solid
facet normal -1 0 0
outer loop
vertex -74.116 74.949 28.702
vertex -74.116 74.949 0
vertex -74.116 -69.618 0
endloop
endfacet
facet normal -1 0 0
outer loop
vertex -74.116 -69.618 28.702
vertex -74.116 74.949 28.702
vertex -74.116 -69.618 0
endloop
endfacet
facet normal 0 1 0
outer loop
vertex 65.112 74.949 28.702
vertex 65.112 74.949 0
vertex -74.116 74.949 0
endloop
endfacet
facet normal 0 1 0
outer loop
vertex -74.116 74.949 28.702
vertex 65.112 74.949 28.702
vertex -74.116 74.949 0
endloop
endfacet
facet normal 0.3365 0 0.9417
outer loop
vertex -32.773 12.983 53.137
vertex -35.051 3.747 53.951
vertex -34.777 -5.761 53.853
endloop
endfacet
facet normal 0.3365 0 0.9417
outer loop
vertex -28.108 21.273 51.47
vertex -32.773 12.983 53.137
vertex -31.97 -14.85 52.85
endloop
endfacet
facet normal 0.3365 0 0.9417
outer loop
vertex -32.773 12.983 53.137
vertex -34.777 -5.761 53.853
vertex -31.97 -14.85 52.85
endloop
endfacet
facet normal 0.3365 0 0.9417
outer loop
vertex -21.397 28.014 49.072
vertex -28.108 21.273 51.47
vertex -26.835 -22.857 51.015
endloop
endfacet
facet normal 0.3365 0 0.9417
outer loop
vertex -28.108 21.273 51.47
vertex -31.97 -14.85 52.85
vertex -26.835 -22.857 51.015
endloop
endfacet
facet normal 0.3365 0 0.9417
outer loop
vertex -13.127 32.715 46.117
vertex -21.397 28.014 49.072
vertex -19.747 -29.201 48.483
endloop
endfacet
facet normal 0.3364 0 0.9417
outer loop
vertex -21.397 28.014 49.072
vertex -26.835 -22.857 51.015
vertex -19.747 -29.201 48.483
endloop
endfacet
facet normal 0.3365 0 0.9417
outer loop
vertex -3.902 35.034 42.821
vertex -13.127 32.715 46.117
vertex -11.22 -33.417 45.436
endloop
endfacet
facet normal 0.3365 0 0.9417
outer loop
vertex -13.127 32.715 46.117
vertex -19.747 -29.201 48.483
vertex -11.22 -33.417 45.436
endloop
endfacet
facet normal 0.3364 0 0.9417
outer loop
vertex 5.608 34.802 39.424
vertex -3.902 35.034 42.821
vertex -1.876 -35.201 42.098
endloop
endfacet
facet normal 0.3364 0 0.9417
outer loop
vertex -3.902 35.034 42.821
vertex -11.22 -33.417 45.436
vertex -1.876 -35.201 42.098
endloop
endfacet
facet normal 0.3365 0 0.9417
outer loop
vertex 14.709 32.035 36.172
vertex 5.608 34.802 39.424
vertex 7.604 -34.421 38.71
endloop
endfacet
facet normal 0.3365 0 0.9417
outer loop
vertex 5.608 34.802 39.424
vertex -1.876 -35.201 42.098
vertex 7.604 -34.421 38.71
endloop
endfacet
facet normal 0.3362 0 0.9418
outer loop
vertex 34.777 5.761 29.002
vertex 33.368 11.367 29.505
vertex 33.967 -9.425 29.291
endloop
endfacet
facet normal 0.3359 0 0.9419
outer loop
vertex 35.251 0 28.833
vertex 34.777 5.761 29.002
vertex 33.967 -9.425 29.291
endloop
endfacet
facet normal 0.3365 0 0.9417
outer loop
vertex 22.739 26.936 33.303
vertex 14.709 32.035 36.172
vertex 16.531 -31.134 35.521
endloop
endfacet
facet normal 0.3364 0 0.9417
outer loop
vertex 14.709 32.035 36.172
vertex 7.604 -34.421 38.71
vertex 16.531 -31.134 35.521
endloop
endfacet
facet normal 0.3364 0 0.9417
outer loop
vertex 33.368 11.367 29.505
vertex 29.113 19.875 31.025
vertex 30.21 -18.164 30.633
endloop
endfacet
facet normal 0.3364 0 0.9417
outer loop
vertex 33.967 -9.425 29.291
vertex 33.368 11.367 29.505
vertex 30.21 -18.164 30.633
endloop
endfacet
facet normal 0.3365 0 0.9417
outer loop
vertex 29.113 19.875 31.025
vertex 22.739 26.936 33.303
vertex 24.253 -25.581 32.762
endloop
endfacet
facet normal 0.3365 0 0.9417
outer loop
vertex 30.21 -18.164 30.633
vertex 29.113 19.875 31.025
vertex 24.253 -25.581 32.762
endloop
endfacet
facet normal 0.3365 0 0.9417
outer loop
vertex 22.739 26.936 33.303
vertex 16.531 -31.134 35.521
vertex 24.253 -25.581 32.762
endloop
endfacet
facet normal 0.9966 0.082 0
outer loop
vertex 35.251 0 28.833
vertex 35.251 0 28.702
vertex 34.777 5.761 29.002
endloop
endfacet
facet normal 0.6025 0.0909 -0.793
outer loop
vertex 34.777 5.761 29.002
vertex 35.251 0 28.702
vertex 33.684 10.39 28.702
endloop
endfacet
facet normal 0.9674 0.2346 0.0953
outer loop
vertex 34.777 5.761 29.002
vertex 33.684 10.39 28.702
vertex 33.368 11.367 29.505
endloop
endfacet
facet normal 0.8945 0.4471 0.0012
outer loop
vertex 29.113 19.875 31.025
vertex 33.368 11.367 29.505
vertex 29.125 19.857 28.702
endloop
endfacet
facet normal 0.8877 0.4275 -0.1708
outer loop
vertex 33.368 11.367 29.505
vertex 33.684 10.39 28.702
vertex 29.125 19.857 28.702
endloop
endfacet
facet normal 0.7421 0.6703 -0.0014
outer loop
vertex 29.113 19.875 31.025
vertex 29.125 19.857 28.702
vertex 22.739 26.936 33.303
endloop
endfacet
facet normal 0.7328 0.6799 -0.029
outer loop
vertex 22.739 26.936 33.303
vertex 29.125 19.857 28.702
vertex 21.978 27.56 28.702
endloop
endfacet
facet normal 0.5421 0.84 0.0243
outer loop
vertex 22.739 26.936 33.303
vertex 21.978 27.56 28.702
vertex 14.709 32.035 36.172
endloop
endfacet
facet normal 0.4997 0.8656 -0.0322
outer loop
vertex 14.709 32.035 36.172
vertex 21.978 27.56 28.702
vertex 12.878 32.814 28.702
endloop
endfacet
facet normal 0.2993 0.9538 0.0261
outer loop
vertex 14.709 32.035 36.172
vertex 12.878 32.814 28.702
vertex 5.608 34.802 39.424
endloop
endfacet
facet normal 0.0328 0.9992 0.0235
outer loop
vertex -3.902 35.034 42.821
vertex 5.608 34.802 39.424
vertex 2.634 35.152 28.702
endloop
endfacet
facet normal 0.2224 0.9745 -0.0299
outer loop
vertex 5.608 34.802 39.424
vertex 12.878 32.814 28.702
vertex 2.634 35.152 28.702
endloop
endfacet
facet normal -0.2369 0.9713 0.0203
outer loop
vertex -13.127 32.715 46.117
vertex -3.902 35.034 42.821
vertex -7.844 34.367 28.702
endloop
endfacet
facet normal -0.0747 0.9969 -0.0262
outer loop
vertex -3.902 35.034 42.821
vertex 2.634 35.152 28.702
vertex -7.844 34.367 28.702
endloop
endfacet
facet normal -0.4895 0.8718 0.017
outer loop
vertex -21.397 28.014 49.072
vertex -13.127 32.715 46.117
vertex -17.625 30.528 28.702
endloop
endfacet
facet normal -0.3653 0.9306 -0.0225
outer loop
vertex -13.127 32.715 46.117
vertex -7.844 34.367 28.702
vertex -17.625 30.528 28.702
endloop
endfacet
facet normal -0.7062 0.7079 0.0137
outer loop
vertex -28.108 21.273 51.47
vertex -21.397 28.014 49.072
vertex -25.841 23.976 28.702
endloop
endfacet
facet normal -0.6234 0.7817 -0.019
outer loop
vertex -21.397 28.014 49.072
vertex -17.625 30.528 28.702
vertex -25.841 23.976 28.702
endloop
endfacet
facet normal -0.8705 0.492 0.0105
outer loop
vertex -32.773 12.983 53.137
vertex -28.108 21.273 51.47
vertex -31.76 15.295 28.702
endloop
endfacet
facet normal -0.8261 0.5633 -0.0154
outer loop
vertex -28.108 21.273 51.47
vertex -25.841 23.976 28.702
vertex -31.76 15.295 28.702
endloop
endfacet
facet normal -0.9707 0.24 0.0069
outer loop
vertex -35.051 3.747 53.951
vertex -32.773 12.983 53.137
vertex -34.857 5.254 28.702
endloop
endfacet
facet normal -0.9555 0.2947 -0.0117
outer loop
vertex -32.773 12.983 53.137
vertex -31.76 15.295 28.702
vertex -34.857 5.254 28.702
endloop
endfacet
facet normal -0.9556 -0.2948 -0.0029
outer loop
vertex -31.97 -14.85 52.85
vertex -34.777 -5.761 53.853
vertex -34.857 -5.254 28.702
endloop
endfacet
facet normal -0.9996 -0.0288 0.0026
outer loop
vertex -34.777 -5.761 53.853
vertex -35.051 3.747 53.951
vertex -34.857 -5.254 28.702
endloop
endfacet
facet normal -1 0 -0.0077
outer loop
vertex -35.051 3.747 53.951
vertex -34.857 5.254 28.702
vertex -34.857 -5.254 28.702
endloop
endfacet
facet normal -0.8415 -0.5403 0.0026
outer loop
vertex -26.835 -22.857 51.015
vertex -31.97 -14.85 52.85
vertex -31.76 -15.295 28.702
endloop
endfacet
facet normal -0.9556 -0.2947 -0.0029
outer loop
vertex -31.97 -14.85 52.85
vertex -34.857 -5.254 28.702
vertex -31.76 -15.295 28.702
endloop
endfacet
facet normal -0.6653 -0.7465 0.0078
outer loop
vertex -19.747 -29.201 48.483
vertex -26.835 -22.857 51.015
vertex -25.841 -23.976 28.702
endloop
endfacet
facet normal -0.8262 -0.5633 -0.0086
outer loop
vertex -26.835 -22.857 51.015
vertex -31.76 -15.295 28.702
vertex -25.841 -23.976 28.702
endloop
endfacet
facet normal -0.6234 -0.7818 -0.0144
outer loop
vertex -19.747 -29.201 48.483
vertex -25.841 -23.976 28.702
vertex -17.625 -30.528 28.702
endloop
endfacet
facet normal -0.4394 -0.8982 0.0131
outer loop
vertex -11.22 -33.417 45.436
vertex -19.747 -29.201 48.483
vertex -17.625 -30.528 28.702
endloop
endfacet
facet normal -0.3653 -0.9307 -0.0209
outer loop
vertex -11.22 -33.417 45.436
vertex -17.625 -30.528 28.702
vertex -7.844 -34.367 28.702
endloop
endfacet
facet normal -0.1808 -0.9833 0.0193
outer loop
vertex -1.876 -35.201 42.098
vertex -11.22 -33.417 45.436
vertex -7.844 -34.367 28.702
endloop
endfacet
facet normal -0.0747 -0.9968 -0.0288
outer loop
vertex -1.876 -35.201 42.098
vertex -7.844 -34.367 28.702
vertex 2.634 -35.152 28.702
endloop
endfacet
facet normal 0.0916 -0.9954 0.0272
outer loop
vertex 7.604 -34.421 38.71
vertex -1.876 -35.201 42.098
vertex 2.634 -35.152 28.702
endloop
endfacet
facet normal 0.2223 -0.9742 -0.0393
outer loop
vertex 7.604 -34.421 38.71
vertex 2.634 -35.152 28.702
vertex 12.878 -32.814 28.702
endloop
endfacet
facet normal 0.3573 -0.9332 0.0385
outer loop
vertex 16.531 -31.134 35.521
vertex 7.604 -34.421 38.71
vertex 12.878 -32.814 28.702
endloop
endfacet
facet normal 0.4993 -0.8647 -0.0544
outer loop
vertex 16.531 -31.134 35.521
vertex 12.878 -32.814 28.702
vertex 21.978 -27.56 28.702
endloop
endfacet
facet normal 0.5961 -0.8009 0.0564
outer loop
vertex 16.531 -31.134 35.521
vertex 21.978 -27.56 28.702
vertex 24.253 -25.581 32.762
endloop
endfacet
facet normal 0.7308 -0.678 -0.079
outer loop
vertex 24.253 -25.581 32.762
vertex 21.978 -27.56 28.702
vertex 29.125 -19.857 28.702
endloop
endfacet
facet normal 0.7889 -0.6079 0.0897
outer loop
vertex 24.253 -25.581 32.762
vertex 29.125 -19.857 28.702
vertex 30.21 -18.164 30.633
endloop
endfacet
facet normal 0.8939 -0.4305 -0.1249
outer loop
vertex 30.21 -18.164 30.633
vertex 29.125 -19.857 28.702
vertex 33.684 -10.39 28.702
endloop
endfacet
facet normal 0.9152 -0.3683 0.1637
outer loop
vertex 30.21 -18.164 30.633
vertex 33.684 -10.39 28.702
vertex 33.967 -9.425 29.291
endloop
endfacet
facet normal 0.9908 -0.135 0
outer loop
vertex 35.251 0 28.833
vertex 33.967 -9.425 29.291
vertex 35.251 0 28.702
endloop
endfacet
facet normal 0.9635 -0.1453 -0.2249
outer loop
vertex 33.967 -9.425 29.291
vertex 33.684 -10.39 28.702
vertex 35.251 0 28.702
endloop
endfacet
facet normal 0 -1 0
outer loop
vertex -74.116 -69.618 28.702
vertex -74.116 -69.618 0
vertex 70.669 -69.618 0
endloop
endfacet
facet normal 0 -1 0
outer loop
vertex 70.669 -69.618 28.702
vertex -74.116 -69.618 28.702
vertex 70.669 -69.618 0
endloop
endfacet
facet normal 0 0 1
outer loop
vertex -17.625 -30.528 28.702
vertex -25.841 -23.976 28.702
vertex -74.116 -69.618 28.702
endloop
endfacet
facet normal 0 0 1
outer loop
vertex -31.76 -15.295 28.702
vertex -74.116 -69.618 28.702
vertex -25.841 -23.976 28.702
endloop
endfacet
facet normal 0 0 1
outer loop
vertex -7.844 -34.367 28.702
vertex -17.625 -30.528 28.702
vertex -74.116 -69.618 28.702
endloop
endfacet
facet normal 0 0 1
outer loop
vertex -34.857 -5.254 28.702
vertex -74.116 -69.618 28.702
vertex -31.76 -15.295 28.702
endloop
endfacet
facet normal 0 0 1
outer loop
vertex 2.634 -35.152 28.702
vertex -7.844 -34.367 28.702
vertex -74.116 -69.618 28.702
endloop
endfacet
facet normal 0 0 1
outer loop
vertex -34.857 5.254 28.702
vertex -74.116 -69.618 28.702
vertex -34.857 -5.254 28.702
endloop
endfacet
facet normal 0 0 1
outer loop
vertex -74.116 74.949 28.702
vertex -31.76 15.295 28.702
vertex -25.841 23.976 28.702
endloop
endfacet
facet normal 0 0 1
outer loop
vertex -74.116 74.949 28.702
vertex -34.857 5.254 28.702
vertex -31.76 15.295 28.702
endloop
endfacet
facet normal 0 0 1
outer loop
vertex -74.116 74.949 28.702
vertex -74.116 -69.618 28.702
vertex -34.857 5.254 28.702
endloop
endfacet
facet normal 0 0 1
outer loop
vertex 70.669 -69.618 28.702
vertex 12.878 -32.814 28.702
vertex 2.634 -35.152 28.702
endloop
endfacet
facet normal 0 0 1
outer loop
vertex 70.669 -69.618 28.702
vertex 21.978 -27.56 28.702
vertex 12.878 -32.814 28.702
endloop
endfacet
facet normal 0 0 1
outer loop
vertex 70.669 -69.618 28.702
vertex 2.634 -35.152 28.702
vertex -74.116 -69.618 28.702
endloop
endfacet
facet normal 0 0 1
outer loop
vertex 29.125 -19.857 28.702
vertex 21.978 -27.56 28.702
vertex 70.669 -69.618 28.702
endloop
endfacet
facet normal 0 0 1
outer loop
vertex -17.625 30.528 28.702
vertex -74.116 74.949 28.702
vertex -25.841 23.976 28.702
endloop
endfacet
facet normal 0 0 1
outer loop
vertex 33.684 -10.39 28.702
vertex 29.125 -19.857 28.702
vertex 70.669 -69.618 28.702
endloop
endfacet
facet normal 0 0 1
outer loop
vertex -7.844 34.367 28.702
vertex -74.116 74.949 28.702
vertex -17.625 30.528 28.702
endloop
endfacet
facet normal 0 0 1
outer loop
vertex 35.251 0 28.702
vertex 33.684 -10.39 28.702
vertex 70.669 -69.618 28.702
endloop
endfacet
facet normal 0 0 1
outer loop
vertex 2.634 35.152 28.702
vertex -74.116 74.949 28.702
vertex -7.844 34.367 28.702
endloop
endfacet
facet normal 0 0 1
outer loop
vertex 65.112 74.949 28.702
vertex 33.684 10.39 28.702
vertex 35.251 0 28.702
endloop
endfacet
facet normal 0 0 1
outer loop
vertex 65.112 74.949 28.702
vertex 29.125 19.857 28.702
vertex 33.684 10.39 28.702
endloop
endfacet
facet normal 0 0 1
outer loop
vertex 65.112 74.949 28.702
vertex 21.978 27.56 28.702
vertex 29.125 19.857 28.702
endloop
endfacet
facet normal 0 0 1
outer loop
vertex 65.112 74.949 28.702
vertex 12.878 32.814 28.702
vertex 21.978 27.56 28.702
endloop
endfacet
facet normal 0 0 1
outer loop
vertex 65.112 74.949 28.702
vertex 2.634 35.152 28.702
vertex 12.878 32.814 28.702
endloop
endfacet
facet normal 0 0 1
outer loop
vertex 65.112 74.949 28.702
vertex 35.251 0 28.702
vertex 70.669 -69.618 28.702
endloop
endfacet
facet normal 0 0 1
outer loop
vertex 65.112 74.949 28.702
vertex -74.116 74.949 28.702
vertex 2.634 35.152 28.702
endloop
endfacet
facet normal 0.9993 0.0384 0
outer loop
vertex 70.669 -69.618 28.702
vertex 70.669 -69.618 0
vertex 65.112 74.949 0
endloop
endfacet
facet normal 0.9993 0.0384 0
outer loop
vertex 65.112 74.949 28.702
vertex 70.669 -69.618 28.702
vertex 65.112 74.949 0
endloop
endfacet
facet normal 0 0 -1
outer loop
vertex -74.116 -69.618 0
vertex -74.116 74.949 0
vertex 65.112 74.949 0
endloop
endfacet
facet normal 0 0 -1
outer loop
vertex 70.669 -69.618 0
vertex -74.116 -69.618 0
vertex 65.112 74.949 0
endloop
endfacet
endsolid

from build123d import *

# Parameters (mm, degrees)
F1_DEPTH = 28.702
F2_R     = 35.250577
F3_DEPTH = 25.4
F5_DEPTH = 144.567961


with BuildPart() as f1:
    # F0 (on Top) → F1 (new body)
    with BuildSketch(Plane.XY):
        Polygon((65.11163, 74.948795), (-74.116208, 74.948795), (-74.116208, -69.618165), (70.669487, -69.618165), align=None)
    extrude(amount=F1_DEPTH)

    # F2 (on face) → F3 (join)
    with BuildSketch(Plane.XY.offset(28.702)):
        Circle(F2_R)
    extrude(amount=F3_DEPTH)

    # F4 (on face) → F5 (cut, through all)
    with BuildSketch(Plane.XZ.offset(69.618165)):
        Polygon((35.616178, 54.999514), (-38.837059, 55.3034), (35.616178, 28.702), align=None)
    extrude(amount=-F5_DEPTH, mode=Mode.SUBTRACT)


solid = f1.part
